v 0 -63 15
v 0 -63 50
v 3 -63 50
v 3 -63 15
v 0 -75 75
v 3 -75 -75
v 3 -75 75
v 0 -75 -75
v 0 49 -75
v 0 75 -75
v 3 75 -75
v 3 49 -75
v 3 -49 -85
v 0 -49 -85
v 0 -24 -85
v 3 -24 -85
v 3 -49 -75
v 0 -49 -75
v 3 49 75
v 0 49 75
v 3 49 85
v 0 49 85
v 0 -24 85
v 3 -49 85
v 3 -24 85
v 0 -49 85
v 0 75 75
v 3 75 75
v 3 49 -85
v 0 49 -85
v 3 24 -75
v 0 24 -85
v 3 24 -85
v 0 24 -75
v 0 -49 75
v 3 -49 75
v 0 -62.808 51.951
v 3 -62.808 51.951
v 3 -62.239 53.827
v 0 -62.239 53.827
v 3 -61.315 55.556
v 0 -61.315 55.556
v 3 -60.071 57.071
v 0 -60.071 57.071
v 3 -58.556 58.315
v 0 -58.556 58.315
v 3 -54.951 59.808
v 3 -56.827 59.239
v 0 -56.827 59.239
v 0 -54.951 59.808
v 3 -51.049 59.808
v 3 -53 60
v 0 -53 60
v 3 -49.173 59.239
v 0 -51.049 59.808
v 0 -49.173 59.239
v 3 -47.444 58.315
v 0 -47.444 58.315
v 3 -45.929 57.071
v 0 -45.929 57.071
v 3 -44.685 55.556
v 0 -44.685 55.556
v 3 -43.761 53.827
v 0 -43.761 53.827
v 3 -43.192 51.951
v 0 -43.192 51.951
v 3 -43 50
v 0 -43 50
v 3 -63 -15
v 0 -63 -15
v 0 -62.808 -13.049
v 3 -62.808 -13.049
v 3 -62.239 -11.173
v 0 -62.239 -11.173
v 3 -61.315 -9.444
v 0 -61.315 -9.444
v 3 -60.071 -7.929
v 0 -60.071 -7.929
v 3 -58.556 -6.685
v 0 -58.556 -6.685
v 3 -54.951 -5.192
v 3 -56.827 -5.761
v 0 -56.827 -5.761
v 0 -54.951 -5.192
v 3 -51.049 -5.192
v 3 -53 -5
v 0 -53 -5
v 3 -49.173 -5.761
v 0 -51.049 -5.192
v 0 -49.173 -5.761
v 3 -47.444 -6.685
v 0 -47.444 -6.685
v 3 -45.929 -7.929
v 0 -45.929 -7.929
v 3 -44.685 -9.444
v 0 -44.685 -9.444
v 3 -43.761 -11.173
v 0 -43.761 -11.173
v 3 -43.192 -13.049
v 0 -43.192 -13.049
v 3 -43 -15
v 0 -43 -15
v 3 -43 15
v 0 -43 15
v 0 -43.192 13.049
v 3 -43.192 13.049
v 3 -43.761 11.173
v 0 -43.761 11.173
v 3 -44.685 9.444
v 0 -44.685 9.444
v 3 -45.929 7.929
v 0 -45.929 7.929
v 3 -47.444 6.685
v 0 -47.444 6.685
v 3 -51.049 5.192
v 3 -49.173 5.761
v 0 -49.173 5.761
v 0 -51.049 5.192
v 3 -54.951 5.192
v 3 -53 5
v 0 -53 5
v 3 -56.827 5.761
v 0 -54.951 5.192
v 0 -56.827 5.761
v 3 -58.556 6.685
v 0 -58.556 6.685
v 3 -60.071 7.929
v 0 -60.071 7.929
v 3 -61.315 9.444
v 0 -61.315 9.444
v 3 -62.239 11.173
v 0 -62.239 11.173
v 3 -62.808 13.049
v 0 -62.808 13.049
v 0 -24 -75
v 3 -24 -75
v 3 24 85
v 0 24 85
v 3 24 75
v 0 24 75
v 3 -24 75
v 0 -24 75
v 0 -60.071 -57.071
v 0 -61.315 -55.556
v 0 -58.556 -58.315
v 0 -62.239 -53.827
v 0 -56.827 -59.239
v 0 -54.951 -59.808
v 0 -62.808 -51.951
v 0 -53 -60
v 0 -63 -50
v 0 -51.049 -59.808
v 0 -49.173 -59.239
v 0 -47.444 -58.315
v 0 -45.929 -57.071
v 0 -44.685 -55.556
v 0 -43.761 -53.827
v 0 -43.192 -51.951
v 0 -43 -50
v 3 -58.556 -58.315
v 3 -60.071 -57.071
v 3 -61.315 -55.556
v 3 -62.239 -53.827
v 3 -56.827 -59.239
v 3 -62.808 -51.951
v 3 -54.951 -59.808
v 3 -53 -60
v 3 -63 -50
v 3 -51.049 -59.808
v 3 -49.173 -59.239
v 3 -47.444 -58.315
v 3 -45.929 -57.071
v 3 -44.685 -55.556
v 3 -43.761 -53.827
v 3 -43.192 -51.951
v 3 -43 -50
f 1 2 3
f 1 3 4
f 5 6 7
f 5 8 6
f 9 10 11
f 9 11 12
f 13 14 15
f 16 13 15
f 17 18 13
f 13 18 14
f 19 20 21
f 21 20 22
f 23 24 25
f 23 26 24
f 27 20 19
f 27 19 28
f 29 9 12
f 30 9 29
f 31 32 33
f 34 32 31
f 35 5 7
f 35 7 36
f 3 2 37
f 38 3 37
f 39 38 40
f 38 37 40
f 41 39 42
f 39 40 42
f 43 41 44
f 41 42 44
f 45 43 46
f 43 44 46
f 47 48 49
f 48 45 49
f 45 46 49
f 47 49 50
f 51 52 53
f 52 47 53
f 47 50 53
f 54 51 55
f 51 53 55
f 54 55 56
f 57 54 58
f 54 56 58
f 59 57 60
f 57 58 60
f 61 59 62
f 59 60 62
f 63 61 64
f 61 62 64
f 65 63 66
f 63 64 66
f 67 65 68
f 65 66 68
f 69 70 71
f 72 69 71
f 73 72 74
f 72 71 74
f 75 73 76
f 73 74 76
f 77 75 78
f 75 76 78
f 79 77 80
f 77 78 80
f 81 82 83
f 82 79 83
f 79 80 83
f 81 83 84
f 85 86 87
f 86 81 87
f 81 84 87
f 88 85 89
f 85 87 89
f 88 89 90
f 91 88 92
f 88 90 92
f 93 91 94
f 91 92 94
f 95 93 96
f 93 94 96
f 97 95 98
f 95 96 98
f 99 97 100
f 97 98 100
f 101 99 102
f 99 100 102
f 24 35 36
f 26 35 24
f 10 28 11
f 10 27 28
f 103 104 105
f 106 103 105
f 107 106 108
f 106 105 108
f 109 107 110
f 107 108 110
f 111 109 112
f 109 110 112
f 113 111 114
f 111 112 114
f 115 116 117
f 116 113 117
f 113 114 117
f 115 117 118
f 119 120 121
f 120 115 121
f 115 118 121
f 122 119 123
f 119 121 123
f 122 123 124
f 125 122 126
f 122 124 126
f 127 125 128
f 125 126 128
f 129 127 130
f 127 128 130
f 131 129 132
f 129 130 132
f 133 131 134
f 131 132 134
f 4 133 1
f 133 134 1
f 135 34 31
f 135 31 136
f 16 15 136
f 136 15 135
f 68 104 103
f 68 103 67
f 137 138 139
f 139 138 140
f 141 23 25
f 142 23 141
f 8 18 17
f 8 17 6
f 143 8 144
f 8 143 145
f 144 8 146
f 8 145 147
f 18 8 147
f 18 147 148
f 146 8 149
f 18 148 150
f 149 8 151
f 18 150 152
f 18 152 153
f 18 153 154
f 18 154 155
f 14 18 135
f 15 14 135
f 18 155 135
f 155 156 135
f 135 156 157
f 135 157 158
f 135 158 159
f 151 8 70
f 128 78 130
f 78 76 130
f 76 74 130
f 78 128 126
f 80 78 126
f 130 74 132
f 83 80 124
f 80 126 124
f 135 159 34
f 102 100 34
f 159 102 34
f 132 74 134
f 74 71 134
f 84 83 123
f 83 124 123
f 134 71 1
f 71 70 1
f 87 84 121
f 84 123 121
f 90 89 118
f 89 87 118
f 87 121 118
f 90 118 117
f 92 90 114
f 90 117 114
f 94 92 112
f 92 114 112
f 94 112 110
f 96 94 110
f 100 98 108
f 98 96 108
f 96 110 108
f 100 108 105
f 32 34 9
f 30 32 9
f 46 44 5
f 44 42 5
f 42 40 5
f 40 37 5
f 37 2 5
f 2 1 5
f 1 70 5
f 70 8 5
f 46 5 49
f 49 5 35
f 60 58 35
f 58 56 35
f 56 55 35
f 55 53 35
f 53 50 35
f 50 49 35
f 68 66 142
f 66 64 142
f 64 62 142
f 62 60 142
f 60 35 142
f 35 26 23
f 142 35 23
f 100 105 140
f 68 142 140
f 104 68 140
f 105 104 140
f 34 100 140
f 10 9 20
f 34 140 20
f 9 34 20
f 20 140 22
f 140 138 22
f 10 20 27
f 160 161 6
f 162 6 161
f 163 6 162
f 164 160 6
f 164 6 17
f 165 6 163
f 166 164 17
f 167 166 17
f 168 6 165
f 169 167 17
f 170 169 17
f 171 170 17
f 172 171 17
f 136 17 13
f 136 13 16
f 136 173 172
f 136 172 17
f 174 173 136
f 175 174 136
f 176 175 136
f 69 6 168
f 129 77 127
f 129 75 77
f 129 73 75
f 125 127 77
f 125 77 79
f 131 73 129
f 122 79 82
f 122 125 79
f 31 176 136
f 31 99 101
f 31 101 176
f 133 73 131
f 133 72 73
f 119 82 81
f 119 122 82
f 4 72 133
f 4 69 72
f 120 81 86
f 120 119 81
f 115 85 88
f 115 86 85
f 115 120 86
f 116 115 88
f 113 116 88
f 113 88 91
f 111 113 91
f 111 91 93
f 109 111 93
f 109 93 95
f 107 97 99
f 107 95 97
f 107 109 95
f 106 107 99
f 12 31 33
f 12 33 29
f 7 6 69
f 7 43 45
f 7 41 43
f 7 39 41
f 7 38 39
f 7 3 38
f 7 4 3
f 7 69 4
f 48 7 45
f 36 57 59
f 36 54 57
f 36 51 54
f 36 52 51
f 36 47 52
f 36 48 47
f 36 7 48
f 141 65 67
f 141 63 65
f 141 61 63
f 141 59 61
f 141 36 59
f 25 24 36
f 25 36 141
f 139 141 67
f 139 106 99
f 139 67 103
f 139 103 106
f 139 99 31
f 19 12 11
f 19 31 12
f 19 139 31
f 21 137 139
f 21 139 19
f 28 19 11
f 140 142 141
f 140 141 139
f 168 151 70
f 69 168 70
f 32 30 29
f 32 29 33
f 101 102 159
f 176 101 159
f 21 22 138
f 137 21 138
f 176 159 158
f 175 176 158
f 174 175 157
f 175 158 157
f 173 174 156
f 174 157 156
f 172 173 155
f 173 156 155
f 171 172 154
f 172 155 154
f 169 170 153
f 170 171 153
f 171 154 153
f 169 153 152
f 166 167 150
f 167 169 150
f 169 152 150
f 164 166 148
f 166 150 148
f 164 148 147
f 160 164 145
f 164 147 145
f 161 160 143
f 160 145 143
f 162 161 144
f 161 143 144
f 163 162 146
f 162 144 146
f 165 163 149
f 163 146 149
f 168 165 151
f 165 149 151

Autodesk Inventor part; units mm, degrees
ref_plane "YZ Plane" through (0, 0, 0) normal (1, 0, 0) x (0, 1, 0)
ref_plane "XZ Plane" through (0, 0, 0) normal (0, 1, 0) x (-1, 0, 0)
ref_plane "XY Plane" through (0, 0, 0) normal (0, 0, 1) x (1, 0, 0)
sketch "Sketch1" plane through (0, 0, 0) normal (1, 0, 0) x (0, 1, 0)
  line L0 (75, 75) -> (75, -75)
  line L1 (-75, -75) -> (-75, 75)
  line L2 (-75, 75) -> (75, -75) construction
  line L3 (75, 75) -> (-75, -75) construction
  line L4 (-53, 50) -> (-53, 15) construction
  line L5 (-63, 50) -> (-63, 15)
  line L6 (-43, 15) -> (-43, 50)
  arc A0 (-43, 50) -> (-63, 50) centre (-53, 50) ccw
  arc A1 (-63, 15) -> (-43, 15) centre (-53, 15) ccw
  line L7 (-53, -15) -> (-53, -50) construction
  line L8 (-43, -15) -> (-43, -50)
  line L9 (-63, -50) -> (-63, -15)
  arc A2 (-43, -15) -> (-63, -15) centre (-53, -15) ccw
  arc A3 (-63, -50) -> (-43, -50) centre (-53, -50) ccw
  line L10 (49, 75) -> (49, 85)
  line L11 (49, 85) -> (24, 85)
  line L12 (24, 85) -> (24, 75)
  line L13 (0, 0) -> (0, 108)
  line L14 (-49, 75) -> (-49, 85)
  line L15 (-49, 85) -> (-24, 85)
  line L16 (-24, 85) -> (-24, 75)
  line L17 (0, 0) -> (84, 0)
  line L18 (49, -75) -> (49, -85)
  line L19 (49, -85) -> (24, -85)
  line L20 (24, -85) -> (24, -75)
  line L21 (-49, -75) -> (-49, -85)
  line L22 (-49, -85) -> (-24, -85)
  line L23 (-24, -85) -> (-24, -75)
  line L24 (49, 75) -> (75, 75)
  line L25 (-75, 75) -> (-49, 75)
  line L26 (-24, 75) -> (24, 75)
  line L27 (75, -75) -> (49, -75)
  line L28 (24, -75) -> (-24, -75)
  line L29 (-49, -75) -> (-75, -75)
  point P0 (-53, 32.5)
  point P1 (-53, -32.5)
  dimension "d0" = 150
  dimension "d1" = 150
  dimension "d2" = 25
  dimension "d4" = 25
  dimension "d5" = 35
  dimension "d6" = 35
  dimension "d7" = 22
  dimension "d8" = 10
  dimension "d9" = 10
  dimension "d12" = 25
  dimension "d13" = 26
  dimension "d14" = 10
  dimension "d15" = 10
  dimension "d16" = 9
  dimension "d17" = 183
extrude "Extrusion1" add sketch "Sketch1" along normal blind 3
properties part number "back_part"
